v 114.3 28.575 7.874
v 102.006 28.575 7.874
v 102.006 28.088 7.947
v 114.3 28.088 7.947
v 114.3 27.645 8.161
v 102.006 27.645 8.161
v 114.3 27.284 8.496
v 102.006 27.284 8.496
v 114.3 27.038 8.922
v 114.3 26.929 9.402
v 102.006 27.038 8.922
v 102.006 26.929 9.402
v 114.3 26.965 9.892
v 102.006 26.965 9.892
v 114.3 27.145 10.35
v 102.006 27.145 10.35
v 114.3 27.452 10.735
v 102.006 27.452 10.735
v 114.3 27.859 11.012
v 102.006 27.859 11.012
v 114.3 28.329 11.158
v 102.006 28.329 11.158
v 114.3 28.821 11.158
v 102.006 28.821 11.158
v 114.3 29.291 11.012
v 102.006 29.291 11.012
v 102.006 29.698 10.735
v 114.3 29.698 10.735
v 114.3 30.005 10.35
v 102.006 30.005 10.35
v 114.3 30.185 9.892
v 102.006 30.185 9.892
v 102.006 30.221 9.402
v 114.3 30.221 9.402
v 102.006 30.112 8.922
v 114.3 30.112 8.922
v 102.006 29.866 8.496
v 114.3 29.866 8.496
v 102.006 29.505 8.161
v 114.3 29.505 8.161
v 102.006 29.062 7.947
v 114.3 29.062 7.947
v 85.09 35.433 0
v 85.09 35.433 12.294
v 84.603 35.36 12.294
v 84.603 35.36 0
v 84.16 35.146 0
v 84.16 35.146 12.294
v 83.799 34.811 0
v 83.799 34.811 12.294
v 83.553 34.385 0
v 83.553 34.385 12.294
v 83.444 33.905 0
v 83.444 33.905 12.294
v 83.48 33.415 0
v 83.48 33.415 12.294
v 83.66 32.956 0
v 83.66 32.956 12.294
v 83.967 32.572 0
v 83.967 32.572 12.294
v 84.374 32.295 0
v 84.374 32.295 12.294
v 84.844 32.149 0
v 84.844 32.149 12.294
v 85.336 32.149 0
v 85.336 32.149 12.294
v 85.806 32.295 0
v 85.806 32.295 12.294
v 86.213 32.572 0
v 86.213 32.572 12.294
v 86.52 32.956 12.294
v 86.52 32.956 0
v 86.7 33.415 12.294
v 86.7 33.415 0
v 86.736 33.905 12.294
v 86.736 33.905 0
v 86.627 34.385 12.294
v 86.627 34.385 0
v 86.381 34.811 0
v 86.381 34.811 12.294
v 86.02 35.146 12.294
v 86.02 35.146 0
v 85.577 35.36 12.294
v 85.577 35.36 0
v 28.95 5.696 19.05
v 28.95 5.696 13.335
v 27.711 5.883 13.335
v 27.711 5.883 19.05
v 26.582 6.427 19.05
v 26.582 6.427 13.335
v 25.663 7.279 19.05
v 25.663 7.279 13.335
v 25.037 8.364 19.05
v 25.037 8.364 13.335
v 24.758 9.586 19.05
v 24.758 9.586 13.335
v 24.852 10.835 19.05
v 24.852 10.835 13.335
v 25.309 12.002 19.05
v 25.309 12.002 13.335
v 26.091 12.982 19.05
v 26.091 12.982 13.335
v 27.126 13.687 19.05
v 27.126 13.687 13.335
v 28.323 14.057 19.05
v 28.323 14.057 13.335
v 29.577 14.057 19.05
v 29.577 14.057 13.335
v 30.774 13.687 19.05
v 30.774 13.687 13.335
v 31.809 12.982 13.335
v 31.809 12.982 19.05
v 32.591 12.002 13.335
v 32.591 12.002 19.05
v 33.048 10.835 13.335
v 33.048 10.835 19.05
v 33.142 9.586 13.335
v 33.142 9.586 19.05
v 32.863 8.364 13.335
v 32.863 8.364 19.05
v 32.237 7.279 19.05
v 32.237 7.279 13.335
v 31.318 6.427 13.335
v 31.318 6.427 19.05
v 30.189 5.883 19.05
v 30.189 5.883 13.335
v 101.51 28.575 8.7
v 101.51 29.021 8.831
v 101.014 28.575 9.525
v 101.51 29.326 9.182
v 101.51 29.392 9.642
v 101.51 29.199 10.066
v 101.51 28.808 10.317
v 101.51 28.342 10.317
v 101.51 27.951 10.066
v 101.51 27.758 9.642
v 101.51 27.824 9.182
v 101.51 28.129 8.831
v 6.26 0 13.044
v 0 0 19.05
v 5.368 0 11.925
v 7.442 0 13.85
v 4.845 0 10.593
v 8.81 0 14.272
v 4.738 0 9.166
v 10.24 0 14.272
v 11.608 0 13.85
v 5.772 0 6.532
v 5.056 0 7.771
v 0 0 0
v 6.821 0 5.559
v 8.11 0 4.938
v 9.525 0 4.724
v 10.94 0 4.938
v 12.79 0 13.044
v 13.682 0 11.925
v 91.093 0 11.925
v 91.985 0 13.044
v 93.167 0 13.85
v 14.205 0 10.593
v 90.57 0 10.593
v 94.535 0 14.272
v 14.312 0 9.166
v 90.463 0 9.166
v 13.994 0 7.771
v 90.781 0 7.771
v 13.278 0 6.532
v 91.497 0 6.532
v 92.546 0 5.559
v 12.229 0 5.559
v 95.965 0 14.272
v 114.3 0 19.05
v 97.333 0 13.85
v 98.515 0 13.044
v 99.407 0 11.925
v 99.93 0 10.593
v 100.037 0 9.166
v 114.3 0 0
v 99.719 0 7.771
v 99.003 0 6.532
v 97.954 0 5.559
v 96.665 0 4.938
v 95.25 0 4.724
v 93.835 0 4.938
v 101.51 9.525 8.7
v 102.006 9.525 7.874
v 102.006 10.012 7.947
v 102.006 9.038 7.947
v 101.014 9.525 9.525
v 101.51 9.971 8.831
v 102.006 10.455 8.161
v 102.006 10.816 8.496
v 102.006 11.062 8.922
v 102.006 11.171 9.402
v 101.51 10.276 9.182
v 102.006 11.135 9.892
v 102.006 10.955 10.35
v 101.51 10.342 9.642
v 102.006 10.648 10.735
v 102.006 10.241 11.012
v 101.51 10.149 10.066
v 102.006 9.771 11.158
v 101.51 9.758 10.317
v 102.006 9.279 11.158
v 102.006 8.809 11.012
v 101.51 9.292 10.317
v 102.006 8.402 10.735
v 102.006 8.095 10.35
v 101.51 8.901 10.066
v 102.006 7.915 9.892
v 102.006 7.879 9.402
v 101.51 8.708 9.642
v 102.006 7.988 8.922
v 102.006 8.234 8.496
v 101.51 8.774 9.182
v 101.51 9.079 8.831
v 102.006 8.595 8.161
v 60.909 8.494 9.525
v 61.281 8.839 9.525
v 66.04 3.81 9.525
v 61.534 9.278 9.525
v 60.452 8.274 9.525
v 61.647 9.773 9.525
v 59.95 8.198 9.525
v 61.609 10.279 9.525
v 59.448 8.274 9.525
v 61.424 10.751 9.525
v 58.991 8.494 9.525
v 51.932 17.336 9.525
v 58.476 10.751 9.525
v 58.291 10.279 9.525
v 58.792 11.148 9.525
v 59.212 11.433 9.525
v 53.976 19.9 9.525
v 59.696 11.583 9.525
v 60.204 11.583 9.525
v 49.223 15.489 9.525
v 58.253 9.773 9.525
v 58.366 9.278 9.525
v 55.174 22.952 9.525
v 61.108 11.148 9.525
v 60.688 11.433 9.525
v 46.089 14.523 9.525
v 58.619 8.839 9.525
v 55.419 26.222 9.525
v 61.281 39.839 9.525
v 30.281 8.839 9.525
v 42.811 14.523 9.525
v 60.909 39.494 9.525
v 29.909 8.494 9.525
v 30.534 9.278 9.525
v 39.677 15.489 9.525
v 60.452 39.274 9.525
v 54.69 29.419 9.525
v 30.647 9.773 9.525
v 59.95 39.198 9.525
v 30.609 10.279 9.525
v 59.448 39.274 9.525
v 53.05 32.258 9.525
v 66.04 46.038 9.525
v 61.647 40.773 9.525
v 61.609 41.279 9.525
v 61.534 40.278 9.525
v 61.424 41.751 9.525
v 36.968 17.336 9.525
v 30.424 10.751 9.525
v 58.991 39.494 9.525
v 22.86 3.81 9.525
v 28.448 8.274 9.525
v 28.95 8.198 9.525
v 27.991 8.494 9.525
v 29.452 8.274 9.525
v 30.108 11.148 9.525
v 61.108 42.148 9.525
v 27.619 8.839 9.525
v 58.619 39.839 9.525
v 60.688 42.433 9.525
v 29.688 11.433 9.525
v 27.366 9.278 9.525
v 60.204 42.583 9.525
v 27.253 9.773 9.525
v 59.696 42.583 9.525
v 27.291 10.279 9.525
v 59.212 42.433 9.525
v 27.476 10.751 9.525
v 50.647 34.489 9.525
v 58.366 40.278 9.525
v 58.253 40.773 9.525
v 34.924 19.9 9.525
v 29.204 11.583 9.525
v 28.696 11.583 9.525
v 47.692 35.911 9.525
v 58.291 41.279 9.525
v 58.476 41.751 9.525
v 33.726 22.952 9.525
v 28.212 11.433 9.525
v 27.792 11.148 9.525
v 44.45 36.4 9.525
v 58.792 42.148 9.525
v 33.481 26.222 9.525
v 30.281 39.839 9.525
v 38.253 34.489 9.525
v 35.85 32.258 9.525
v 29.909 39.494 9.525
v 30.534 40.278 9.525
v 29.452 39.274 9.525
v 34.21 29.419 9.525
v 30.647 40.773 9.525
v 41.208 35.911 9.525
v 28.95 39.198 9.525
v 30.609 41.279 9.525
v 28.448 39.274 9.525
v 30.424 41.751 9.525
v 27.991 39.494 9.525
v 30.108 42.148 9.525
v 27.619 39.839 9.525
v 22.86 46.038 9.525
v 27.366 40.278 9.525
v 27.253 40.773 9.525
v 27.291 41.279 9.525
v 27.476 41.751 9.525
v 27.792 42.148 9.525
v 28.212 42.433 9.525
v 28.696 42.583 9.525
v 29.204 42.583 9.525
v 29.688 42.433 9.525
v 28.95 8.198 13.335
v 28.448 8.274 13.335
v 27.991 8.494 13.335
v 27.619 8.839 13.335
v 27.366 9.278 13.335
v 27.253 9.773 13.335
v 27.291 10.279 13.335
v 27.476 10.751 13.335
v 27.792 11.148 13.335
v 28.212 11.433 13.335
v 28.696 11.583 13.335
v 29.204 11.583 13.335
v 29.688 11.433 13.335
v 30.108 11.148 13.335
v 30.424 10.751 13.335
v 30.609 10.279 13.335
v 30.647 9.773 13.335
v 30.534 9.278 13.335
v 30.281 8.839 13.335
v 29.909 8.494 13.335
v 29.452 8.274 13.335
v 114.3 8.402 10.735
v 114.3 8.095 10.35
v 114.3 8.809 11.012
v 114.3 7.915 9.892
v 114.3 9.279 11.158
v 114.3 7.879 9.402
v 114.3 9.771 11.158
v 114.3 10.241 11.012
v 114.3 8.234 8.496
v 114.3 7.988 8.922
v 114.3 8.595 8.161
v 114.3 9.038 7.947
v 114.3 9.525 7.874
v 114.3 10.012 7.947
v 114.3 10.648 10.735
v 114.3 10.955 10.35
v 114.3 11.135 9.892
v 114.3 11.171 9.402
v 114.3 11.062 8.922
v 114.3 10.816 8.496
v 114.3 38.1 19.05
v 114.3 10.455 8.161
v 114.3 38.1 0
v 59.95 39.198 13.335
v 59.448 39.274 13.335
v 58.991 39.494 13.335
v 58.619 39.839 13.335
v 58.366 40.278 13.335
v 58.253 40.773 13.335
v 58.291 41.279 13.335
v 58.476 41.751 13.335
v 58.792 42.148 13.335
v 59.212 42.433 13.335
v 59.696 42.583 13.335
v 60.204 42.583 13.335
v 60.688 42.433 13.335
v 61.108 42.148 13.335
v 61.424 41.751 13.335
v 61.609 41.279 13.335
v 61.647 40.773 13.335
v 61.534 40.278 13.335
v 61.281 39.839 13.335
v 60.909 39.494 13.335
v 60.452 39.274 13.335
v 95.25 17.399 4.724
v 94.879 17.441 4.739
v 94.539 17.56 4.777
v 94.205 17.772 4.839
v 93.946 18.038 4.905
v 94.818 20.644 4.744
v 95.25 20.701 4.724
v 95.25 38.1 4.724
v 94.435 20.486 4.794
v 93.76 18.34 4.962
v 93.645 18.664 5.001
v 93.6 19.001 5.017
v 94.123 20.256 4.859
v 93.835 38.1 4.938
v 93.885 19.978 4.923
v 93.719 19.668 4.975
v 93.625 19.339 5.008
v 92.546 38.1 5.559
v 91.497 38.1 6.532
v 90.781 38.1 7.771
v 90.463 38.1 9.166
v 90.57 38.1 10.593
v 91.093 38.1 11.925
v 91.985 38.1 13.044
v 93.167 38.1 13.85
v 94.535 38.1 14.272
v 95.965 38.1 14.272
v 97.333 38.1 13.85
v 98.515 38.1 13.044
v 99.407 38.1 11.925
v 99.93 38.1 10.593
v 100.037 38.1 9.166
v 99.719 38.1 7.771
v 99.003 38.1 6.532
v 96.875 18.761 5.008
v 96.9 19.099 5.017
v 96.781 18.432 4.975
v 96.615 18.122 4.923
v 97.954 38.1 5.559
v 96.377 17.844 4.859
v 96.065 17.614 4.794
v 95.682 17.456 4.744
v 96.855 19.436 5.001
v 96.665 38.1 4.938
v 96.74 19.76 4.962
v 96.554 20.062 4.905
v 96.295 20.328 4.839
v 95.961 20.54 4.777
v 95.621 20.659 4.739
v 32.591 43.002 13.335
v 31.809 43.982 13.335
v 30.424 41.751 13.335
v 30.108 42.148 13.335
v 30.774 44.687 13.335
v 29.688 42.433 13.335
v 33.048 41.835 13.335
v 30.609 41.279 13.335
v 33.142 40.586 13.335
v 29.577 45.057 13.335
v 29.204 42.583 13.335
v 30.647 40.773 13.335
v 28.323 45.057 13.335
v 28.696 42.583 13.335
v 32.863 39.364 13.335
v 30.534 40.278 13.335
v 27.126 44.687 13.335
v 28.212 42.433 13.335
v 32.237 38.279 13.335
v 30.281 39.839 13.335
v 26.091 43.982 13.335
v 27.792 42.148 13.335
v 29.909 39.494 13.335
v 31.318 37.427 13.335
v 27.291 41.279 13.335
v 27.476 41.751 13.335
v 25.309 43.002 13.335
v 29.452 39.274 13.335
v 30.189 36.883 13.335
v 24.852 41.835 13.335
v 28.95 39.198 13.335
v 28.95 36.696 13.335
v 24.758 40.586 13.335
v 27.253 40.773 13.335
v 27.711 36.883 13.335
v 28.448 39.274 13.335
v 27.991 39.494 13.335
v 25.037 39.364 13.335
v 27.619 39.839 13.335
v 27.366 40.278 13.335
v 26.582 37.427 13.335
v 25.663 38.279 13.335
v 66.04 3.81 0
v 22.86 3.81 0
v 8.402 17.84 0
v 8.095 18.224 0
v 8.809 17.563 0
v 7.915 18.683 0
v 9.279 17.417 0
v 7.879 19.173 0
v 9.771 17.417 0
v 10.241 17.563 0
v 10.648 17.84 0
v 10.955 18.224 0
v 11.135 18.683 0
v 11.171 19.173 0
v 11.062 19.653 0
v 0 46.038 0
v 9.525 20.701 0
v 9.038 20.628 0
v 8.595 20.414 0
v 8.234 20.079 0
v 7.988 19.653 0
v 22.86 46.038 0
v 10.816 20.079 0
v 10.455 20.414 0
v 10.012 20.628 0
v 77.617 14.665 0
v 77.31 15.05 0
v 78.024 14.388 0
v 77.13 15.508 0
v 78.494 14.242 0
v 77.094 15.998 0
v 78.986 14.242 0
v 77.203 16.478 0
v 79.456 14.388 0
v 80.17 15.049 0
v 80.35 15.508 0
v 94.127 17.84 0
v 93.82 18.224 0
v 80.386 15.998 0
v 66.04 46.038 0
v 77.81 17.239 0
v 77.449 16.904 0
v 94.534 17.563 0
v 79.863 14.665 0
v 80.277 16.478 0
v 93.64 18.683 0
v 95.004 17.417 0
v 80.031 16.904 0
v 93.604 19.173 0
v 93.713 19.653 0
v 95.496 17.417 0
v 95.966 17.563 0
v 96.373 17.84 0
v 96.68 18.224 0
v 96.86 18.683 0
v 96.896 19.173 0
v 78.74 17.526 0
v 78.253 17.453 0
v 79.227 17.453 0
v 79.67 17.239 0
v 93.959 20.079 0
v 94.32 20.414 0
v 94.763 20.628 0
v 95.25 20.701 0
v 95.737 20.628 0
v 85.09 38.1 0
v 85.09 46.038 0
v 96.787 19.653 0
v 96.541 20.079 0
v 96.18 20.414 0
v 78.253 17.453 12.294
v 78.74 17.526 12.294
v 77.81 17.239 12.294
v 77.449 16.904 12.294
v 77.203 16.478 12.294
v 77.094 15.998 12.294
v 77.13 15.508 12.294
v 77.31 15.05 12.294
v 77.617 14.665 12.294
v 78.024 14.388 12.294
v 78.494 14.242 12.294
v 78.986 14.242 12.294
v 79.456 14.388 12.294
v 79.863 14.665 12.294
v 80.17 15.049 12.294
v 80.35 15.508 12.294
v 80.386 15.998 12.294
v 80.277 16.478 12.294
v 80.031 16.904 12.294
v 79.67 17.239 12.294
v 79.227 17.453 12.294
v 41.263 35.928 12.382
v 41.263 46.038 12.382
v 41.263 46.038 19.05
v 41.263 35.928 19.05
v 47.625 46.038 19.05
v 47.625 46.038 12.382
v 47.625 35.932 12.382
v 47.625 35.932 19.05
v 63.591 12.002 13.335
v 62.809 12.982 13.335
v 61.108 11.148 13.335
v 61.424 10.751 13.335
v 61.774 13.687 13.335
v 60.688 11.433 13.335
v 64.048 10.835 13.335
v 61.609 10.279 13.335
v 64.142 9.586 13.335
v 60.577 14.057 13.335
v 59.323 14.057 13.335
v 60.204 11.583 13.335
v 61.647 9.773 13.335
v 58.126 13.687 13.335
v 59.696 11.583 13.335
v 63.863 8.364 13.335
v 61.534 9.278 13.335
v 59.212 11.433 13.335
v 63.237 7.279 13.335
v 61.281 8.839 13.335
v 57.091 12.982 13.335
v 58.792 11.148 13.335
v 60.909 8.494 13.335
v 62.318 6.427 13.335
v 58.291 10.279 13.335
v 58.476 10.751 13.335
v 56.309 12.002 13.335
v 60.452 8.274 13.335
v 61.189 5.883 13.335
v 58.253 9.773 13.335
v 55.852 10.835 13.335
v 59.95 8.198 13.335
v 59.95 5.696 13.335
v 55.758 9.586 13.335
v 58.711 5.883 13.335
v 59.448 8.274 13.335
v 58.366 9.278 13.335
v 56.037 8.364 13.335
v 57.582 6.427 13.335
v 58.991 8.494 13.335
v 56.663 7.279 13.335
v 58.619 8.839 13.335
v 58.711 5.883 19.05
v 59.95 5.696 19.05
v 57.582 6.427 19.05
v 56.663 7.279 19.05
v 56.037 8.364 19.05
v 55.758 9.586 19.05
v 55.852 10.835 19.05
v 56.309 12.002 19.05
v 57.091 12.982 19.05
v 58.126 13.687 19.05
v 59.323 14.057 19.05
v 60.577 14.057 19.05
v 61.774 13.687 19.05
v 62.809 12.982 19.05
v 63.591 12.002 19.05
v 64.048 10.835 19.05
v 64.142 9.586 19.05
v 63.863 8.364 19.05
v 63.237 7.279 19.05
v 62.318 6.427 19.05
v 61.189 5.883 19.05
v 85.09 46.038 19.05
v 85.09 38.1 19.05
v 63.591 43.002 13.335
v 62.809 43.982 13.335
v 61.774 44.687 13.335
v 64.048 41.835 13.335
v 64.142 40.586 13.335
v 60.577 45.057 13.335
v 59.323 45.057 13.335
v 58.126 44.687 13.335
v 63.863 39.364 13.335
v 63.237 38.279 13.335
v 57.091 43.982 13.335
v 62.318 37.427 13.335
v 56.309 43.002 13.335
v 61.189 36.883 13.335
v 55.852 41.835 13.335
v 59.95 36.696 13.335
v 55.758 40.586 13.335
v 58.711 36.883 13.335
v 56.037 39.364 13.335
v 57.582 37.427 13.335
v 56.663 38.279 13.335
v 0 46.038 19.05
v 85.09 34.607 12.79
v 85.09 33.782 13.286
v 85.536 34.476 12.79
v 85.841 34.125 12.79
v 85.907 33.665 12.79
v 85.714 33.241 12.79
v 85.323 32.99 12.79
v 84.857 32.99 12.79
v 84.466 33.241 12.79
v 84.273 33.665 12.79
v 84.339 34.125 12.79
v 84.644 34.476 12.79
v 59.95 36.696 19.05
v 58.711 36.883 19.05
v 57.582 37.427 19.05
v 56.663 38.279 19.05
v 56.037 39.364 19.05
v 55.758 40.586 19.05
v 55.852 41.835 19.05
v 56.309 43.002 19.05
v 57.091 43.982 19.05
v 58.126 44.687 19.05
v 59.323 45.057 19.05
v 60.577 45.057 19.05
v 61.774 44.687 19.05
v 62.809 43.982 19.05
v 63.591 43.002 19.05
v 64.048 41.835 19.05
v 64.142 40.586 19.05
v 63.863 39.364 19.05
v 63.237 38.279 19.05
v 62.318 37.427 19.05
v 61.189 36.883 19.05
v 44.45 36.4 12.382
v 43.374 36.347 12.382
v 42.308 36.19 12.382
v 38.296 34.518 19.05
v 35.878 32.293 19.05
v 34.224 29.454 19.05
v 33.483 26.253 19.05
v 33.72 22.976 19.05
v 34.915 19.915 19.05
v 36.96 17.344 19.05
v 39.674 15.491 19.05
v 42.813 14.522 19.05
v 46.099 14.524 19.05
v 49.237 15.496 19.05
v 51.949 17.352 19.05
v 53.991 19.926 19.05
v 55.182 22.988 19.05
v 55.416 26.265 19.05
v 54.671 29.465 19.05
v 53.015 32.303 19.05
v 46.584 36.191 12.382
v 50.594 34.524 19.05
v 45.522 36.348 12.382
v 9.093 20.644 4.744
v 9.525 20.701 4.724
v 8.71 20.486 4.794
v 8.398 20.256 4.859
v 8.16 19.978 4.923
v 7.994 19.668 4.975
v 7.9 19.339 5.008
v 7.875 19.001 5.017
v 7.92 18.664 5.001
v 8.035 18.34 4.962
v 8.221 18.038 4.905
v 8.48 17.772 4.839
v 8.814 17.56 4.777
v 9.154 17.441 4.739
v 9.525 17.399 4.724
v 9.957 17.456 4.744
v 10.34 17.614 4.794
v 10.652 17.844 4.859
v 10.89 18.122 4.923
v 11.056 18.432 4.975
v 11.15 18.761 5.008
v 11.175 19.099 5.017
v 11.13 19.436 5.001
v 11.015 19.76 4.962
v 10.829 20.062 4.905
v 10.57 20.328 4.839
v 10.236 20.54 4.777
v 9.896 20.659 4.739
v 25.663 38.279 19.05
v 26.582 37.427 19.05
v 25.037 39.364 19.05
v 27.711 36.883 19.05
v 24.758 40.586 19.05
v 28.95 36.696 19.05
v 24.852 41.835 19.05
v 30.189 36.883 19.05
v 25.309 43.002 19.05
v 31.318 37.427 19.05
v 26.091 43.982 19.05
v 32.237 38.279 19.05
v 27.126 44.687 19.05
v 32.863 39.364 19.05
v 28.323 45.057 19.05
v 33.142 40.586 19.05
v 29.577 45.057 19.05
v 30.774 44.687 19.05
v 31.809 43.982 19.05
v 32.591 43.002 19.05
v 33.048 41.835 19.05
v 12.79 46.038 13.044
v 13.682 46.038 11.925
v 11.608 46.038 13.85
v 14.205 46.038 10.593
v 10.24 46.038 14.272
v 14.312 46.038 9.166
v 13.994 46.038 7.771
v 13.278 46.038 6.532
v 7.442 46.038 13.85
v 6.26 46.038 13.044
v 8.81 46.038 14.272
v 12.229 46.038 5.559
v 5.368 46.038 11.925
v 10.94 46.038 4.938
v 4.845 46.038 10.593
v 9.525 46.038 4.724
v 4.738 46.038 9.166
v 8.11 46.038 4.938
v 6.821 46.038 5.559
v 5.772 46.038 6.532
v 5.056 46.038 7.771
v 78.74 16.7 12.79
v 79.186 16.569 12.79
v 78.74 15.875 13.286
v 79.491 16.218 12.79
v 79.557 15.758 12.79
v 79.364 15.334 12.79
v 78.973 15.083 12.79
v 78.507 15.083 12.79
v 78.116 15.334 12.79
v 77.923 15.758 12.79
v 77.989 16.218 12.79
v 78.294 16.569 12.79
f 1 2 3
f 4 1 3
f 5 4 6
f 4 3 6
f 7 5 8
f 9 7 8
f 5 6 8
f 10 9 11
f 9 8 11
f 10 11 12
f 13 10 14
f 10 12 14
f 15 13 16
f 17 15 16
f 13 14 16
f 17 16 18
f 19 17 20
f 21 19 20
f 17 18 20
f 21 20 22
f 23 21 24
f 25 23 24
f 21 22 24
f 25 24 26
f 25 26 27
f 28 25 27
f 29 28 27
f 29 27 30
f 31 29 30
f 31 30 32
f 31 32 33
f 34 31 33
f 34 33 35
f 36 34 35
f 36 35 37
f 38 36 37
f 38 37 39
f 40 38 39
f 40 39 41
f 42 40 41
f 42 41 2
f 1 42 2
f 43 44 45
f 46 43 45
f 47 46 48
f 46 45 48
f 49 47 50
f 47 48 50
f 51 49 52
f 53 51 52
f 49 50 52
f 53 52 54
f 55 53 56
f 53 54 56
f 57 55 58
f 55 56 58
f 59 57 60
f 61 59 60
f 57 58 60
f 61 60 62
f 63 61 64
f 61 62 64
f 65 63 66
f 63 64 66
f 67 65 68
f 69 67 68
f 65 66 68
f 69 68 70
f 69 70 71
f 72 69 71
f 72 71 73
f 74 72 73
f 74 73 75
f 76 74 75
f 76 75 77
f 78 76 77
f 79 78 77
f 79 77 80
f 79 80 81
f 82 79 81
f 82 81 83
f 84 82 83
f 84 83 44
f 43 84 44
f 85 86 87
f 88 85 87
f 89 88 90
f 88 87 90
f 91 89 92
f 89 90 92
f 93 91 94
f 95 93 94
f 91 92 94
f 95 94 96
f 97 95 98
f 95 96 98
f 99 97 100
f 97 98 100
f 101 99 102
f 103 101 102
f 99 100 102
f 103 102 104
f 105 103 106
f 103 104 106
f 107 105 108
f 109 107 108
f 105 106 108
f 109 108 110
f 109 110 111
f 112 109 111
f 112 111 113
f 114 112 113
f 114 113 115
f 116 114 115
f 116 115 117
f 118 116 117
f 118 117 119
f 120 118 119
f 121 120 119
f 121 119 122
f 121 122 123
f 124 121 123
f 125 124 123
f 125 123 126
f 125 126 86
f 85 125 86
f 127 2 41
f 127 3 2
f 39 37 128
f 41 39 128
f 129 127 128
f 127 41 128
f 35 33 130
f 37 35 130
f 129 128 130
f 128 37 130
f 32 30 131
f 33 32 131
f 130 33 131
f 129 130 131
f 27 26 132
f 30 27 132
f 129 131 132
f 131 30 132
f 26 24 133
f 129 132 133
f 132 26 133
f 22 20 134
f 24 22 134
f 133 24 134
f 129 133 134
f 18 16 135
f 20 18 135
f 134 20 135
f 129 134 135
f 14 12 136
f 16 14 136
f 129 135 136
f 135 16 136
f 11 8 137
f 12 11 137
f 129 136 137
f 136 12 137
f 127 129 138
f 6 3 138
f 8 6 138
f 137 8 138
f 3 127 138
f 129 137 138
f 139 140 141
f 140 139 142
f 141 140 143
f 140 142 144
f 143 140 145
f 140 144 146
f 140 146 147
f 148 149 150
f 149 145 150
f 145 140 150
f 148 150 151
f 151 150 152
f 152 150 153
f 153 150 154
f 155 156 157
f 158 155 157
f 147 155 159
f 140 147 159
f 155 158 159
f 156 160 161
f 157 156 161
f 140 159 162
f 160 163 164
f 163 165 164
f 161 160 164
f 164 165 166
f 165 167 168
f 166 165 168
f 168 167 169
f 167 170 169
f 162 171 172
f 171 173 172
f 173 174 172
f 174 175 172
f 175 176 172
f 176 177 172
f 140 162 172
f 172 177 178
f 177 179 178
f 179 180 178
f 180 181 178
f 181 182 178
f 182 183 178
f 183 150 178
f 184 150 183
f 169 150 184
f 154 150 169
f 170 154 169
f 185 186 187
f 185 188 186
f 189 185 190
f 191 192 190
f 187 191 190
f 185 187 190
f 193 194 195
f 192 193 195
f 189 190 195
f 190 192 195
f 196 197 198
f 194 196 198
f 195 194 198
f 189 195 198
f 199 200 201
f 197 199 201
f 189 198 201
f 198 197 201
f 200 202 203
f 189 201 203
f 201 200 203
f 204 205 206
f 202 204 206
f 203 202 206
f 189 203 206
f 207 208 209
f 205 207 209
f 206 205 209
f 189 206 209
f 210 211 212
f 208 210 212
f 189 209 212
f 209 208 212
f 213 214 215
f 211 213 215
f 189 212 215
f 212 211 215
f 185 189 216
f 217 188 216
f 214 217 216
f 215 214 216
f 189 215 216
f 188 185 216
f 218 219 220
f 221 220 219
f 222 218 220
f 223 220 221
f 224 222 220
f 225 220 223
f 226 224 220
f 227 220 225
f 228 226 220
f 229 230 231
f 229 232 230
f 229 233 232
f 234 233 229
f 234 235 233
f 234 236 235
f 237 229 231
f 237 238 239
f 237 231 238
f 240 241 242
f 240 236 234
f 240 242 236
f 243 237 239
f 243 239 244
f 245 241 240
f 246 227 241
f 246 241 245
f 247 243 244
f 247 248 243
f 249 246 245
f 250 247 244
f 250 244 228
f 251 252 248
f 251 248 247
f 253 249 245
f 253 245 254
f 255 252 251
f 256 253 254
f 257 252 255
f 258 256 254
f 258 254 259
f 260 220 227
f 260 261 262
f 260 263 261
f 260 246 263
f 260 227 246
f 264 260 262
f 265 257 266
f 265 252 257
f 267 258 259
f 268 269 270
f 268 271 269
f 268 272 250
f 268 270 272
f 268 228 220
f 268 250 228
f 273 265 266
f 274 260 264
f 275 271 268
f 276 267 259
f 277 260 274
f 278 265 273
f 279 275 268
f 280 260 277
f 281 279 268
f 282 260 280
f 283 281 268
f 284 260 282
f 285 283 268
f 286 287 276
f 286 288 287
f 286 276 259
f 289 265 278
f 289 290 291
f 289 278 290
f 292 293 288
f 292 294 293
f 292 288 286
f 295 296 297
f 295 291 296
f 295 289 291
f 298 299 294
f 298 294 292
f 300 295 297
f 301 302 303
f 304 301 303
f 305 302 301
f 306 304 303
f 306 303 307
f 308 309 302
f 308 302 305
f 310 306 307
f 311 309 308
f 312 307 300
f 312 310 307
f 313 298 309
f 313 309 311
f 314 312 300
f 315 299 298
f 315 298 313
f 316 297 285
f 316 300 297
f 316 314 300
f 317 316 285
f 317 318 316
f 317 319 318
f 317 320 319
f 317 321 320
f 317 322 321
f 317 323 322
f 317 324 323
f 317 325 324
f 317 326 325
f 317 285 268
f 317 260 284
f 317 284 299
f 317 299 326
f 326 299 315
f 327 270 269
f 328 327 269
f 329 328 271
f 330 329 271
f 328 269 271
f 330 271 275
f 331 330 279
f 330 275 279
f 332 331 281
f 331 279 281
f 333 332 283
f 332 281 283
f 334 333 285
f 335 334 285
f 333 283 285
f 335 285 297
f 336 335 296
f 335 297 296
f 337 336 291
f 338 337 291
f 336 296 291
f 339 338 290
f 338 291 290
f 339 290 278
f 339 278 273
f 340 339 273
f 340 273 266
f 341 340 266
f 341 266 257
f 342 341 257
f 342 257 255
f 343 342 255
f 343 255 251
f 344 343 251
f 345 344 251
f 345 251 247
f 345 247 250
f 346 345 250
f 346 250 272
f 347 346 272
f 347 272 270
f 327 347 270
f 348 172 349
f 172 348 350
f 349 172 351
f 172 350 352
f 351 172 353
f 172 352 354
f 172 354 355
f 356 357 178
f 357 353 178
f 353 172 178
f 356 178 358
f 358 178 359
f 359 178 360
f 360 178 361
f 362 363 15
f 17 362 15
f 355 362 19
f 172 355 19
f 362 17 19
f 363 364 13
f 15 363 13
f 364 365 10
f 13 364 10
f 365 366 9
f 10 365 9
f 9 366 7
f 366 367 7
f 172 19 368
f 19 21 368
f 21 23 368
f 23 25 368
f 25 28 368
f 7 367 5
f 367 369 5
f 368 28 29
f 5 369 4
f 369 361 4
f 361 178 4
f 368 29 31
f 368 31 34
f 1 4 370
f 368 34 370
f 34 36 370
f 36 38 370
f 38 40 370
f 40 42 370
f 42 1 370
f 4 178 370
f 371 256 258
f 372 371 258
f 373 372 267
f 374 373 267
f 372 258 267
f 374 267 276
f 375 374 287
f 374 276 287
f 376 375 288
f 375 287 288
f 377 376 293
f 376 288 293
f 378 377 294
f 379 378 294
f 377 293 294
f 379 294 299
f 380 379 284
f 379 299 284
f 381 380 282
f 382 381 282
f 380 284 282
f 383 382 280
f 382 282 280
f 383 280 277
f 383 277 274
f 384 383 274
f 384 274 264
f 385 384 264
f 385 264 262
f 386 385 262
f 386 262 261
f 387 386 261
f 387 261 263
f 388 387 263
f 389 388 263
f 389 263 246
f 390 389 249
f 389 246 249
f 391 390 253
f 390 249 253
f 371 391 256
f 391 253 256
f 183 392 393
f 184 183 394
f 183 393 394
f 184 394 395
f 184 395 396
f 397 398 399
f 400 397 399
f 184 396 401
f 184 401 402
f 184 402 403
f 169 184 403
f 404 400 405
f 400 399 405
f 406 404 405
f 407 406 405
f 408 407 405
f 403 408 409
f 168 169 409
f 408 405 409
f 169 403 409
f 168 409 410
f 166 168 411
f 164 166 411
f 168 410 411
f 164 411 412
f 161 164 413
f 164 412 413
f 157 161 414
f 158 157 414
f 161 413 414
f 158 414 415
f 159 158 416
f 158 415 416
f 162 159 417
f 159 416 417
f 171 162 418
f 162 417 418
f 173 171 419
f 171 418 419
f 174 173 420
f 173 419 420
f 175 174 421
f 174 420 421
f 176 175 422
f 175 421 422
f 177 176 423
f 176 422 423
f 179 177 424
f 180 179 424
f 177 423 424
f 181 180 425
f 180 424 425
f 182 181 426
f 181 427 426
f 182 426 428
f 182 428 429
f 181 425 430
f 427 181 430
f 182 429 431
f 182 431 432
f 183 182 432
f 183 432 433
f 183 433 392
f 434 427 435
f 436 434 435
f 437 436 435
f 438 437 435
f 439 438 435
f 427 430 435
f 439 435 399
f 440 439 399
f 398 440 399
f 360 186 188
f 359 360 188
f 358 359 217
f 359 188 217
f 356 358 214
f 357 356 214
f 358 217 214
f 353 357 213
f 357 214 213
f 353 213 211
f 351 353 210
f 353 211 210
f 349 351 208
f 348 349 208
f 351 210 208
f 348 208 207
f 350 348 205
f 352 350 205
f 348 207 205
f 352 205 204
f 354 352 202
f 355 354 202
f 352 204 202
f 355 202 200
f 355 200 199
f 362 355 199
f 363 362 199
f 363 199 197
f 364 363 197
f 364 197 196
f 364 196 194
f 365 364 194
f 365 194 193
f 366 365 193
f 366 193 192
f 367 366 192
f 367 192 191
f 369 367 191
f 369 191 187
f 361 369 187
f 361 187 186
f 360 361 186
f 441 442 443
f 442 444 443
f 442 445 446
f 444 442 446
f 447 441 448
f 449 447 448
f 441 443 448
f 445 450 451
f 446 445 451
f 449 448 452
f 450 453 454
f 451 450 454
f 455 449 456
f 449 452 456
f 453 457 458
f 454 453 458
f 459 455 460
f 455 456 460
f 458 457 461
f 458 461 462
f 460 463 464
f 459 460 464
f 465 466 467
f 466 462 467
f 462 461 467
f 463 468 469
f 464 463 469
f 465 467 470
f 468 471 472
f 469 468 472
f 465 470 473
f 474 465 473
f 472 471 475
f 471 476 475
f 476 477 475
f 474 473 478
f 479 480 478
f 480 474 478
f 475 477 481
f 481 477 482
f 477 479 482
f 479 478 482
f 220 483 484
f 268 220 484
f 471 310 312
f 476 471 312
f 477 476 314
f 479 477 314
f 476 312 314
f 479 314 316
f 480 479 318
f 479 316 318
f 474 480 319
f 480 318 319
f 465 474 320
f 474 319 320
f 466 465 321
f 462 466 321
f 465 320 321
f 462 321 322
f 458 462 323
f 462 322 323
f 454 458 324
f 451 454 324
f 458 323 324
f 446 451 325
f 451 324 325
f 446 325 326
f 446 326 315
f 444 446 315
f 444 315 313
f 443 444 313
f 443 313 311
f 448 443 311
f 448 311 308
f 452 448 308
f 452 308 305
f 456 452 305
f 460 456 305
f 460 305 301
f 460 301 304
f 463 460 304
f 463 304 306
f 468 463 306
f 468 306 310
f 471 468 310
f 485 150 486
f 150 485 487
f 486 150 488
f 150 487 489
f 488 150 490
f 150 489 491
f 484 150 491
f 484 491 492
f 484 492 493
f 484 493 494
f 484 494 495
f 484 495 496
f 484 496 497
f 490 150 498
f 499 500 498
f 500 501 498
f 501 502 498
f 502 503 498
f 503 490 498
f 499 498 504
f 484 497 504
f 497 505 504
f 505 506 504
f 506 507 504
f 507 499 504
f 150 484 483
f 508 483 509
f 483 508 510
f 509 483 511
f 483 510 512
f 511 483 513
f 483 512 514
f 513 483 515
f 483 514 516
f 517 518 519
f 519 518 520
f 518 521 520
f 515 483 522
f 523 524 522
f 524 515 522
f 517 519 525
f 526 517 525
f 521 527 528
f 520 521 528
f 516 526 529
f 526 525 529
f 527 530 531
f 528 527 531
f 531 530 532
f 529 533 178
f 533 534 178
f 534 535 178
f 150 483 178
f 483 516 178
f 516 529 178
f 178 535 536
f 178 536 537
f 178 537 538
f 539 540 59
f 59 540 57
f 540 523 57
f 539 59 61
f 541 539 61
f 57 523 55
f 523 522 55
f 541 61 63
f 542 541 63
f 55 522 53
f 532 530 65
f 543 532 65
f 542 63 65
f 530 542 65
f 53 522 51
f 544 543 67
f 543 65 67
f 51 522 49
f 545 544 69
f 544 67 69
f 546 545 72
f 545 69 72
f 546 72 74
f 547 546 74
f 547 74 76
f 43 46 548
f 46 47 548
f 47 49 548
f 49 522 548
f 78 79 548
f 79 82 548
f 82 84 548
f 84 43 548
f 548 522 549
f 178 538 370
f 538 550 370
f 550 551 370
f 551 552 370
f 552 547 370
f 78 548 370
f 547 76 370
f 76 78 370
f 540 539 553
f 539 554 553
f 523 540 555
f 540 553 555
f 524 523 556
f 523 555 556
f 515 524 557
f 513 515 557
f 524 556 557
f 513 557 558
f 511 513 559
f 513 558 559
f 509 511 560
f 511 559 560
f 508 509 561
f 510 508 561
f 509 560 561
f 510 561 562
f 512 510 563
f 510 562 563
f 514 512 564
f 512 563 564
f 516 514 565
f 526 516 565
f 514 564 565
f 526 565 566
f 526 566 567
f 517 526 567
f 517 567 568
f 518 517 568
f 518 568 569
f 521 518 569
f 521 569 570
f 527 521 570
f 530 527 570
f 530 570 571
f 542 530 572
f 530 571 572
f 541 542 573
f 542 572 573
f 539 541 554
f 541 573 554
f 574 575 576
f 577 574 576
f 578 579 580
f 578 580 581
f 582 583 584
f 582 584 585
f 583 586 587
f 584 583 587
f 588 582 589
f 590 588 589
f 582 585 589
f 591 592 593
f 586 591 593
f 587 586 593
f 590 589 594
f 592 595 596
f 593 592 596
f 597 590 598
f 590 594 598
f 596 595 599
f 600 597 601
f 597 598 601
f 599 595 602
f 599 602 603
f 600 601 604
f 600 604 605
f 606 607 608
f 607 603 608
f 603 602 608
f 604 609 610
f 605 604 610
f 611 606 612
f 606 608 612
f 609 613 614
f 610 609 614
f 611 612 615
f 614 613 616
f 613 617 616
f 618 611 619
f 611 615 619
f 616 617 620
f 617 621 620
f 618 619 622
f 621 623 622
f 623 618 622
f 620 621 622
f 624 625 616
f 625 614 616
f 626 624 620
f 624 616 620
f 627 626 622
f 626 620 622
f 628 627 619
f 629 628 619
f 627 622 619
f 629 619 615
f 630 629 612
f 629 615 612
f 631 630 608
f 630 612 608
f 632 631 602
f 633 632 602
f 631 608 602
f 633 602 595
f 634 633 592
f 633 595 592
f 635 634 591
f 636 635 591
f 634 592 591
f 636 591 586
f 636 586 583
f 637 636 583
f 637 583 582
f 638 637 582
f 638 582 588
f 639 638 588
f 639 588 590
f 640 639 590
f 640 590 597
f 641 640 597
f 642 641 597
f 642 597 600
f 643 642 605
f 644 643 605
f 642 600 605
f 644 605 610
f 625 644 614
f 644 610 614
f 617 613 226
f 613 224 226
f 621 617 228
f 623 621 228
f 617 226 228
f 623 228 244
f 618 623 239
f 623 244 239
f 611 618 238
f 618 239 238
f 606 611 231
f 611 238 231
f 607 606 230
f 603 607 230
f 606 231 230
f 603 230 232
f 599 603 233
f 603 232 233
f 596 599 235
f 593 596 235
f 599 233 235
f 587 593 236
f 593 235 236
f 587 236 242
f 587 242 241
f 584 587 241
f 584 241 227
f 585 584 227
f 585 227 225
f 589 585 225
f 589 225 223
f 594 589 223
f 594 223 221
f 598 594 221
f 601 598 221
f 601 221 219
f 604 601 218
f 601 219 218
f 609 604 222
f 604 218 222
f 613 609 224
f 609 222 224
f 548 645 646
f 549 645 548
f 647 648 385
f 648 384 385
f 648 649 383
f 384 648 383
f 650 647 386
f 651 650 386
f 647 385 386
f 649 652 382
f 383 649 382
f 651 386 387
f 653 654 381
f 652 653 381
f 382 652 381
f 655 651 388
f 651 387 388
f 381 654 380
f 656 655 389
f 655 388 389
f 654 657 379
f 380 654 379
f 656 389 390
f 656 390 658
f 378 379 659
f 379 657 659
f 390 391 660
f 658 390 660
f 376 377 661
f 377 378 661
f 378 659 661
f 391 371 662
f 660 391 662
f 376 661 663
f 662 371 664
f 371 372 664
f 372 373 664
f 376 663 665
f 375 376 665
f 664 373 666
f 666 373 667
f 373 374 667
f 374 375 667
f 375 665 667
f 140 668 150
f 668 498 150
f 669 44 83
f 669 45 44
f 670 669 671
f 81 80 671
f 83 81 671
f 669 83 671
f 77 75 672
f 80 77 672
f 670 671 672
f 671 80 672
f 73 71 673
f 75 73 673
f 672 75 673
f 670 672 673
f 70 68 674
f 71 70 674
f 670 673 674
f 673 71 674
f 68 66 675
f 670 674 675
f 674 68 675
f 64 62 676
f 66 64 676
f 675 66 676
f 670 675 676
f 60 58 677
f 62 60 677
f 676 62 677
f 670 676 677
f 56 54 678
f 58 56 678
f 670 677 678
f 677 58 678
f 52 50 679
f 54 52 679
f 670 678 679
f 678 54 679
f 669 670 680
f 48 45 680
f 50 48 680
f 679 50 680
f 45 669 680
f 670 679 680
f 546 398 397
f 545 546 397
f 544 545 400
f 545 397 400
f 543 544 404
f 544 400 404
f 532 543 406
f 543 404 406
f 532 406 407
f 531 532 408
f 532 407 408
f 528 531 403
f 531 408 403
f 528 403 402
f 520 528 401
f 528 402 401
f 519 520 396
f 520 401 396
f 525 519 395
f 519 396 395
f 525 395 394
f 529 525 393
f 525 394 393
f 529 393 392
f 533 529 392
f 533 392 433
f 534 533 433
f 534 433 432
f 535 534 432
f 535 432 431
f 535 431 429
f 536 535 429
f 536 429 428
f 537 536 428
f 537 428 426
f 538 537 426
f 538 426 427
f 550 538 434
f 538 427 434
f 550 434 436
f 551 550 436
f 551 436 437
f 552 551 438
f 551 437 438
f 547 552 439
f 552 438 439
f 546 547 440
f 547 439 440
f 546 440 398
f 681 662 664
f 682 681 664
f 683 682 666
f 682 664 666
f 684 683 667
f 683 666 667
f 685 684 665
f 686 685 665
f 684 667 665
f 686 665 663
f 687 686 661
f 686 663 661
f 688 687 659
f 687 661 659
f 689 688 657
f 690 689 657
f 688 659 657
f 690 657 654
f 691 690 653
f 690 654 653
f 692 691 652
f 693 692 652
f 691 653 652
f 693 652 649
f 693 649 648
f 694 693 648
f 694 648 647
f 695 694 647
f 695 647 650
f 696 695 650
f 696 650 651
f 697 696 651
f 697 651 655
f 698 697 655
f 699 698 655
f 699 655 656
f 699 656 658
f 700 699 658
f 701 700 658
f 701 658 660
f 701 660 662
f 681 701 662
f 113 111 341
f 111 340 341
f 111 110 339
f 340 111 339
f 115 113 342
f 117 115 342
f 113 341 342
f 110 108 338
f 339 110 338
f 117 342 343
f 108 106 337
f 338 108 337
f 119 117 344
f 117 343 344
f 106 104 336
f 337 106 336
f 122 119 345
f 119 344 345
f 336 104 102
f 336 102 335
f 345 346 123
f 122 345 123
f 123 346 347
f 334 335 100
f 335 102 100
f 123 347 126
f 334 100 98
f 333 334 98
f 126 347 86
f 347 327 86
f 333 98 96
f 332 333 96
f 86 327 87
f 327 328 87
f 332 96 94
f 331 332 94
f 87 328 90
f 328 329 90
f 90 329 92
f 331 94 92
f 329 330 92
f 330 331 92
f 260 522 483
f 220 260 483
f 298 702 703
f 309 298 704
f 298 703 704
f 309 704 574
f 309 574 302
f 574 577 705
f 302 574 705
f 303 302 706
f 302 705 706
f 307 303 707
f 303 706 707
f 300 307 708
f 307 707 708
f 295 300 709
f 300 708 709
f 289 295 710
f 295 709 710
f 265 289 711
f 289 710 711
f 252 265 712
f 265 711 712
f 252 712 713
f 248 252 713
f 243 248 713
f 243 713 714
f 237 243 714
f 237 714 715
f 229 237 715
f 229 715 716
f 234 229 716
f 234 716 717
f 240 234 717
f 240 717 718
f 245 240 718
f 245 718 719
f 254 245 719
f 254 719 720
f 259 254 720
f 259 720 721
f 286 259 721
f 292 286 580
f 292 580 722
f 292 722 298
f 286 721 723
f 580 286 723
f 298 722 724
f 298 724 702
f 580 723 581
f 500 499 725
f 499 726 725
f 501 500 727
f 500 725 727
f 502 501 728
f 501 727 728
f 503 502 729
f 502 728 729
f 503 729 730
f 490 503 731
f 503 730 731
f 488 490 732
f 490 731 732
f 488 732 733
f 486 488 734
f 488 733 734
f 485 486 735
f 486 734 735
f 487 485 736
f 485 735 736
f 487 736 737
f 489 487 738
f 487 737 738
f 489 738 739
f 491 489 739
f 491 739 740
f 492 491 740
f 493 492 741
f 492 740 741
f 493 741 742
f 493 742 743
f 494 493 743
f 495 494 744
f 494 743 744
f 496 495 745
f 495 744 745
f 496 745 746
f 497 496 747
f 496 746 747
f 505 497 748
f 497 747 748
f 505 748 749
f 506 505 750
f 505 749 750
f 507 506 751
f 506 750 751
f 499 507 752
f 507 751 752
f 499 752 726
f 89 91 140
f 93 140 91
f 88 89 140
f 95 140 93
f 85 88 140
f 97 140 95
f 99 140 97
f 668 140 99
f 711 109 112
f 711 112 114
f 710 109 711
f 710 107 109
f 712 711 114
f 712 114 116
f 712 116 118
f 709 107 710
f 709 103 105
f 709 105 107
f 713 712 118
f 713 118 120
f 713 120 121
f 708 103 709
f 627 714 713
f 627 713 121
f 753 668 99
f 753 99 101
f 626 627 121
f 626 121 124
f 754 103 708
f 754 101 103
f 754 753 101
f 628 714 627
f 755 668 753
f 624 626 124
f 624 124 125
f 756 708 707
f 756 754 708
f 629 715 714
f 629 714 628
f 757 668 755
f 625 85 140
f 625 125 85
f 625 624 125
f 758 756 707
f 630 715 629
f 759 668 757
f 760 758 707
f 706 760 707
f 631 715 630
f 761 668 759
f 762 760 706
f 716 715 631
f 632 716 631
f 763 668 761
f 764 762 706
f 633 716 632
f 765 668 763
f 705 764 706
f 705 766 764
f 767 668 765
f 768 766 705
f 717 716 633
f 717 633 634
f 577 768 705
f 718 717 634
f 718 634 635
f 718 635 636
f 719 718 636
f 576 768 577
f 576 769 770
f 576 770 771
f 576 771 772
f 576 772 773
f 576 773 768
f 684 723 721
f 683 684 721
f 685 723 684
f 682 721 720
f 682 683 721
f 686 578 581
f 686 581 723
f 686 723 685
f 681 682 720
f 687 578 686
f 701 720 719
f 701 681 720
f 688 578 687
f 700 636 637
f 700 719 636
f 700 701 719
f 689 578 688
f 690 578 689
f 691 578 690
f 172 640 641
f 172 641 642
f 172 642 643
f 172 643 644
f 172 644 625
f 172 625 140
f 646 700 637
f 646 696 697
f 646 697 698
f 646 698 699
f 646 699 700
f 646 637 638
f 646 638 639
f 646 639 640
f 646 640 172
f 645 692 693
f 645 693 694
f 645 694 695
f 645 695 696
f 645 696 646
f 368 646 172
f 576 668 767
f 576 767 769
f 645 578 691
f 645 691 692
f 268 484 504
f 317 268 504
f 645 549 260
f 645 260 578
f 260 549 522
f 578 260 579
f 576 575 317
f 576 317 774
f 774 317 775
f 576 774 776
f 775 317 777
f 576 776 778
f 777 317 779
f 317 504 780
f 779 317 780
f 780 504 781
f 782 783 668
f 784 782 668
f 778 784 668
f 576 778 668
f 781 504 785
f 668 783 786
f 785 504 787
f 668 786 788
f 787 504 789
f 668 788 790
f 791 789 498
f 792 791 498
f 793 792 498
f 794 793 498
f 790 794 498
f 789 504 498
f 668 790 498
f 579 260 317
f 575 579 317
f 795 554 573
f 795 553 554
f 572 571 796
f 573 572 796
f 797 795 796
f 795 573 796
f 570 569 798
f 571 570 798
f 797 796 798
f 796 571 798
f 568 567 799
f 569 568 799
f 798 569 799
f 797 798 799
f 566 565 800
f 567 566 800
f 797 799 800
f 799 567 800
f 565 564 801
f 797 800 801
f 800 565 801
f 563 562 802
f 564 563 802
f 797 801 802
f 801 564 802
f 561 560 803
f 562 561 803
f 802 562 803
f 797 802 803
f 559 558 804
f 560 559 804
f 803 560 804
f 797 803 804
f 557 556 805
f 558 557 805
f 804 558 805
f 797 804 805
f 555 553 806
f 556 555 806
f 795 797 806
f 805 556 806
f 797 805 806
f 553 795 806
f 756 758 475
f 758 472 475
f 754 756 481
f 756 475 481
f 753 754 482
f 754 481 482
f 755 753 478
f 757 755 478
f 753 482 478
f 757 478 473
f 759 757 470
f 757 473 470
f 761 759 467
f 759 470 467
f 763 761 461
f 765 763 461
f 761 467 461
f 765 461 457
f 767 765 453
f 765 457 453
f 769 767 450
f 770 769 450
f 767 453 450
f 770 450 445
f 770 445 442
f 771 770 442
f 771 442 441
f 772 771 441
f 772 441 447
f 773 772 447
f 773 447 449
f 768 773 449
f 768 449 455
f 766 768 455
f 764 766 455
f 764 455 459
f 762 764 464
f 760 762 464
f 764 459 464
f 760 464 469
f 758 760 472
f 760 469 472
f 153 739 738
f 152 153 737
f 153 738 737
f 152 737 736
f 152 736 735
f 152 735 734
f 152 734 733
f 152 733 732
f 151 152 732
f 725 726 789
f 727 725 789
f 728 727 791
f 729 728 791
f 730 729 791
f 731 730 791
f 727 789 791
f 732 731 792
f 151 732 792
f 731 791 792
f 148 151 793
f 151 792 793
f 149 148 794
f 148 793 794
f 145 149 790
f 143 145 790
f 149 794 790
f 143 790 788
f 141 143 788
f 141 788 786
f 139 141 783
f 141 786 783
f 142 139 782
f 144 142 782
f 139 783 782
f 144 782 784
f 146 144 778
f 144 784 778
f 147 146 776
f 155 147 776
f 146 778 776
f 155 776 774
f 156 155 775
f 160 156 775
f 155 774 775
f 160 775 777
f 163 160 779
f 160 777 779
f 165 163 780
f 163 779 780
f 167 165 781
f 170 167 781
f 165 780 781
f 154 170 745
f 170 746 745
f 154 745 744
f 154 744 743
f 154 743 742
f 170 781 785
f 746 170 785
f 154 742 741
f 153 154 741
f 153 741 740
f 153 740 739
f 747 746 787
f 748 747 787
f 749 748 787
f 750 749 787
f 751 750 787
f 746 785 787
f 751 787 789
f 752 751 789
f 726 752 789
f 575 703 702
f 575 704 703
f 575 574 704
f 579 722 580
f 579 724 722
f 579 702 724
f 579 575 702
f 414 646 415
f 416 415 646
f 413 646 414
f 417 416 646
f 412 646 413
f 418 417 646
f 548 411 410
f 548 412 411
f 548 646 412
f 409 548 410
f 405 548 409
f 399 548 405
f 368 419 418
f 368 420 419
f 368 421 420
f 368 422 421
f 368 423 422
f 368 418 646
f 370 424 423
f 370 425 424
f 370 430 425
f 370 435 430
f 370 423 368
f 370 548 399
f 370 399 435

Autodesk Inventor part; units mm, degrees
ref_plane "YZ Plane" through (0, 0, 0) normal (1, 0, 0) x (0, 1, 0)
ref_plane "XZ Plane" through (0, 0, 0) normal (0, 1, 0) x (-1, 0, 0)
ref_plane "XY Plane" through (0, 0, 0) normal (0, 0, 1) x (1, 0, 0)
sketch "Sketch1" plane through (0, 0, 0) normal (0, 0, 1) x (1, 0, 0)
  line L0 (0, 0) -> (114.3, 0)
  line L1 (114.3, 0) -> (114.3, 46.0375)
  line L2 (114.3, 46.0375) -> (0, 46.0375)
  line L3 (0, 46.0375) -> (0, 0)
  line L4 (69.85, 46.0375) -> (19.05, 46.0375)
  point P0 (44.45, 46.0375)
  dimension "d0" = 114.3
  dimension "d1" = 46.0375
  dimension "d62" = 69.85
extrude "Extrusion1" add sketch "Sketch1" along normal blind 19.05
sketch "Sketch2" plane through (0, 0, 0) normal (0, 0, -1) x (-1, 0, 0)
  line L0 (-114.3, 46.0375) -> (0, 46.0375) projected
  line L1 (-114.3, 0) -> (-114.3, 46.0375) projected
  point P0 (0, 0)
  point P1 (-44.45, 25.4)
  point P2 (-19.05, 38.1)
  point P3 (0, 46.0375)
  dimension "d7" = 20.6375
  dimension "d8" = 69.85
hole "Hole1" at (44.45, 25.4, 0) direction (0, 0, 1) diameter 22 depth 25.4 tip angle 118
sketch "Sketch3" plane through (0, 0, 0) normal (0, 0, -1) x (-1, 0, 0)
  line L0 (-66.04, 3.81) -> (-22.86, 3.81)
  line L1 (-22.86, 3.81) -> (-22.86, 46.99)
  line L2 (-22.86, 46.99) -> (-66.04, 46.99)
  line L3 (-66.04, 46.99) -> (-66.04, 3.81)
  line L4 (-66.04, 3.81) -> (-22.86, 46.99) construction
  line L5 (-22.86, 3.81) -> (-66.04, 46.99) construction
  line L6 (-114.3, 46.0375) -> (0, 46.0375) projected
  line L7 (-69.85, 46.0375) -> (-19.05, 46.0375) projected
  line L8 (-66.04, 46.99) -> (-22.86, 46.99)
  line L9 (-22.86, 46.99) -> (-22.86, 46.0375)
  line L10 (-22.86, 46.0375) -> (-66.04, 46.0375)
  line L11 (-66.04, 46.0375) -> (-66.04, 46.99)
  line L12 (-114.3, 0) -> (-114.3, 46.0375) projected
  point P0 (0, 0)
  point P1 (-44.45, 25.4)
  point P2 (-19.05, 38.1)
  point P3 (0, 46.0375)
  dimension "d16" = 20.6375
  dimension "d17" = 43.18
  dimension "d18" = 43.18
  dimension "d21" = 69.85
  dimension "d22" = 43.18
extrude "Extrusion2" cut sketch "Sketch3" against normal blind 9.525
sketch "Sketch4" plane through (0, 0, 19.05) normal (0, 0, 1) x (1, 0, 0)
  line L0 (28.95, 9.9) -> (59.95, 9.9)
  line L1 (59.95, 9.9) -> (59.95, 40.9)
  line L2 (59.95, 40.9) -> (28.95, 40.9)
  line L3 (28.95, 40.9) -> (28.95, 9.9)
  line L4 (28.95, 9.9) -> (59.95, 40.9) construction
  line L5 (59.95, 9.9) -> (28.95, 40.9) construction
  line L6 (114.3, 46.0375) -> (0, 46.0375) projected
  line L7 (114.3, 0) -> (114.3, 46.0375) projected
  point P0 (0, 0)
  point P1 (44.45, 25.4)
  point P2 (69.85, 38.1)
  point P3 (0, 46.0375)
  dimension "d23" = 20.6375
  dimension "d24" = 69.85
  dimension "d25" = 31
  dimension "d26" = 31
hole "Hole2" at (28.95, 40.9, 19.05) at (28.95, 9.9, 19.05) at (59.95, 40.9, 19.05) at (59.95, 9.9, 19.05) direction (0, 0, -1) diameter 3.4036 end through all counterbore diameter 8.4074 counterbore depth 5.715 clearance for "Hex Head Machine Screw" size "M3" standard "Ansi Metric M Profile"
sketch "Sketch5" plane through (0, 0, 0) normal (0, -1, 0) x (1, 0, 0)
  line L0 (95.25, 9.525) -> (9.525, 9.525)
  line L1 (0, 0) -> (114.3, 0) projected
  line L2 (114.3, 0) -> (114.3, 19.05) projected
  dimension "d34" = 85.725
  dimension "d35" = 9.525
  dimension "d36" = 19.05
hole "Hole3" at (95.25, 0, 9.525) at (9.525, 0, 9.525) direction (0, 1, 0) diameter 9.6012 end through all
sketch "Sketch6" plane through (0, 0, 0) normal (0, 0, -1) x (-1, 0, 0)
  line L0 (-114.3, 46.0375) -> (0, 46.0375) projected
  line L1 (0, 46.0375) -> (0, 0) projected
  line L2 (0, 0) -> (-114.3, 0) projected
  line L3 (-100.0506, 46.0375) -> (-90.4494, 46.0375) projected
  line L4 (-114.3, 0) -> (-114.3, 46.0375) projected
  line L5 (-14.3256, 46.0375) -> (-4.7244, 46.0375) projected
  point P0 (-19.05, 38.1)
  point P1 (-95.25, 19.05)
  point P2 (-9.525, 19.05)
  point P3 (-19.05, 46.0375)
  point P4 (-22.86, 0)
  dimension "d105" = 19.05
  dimension "d108" = 19.05
  dimension "d110" = 9.6012
  dimension "d111" = 4.8006
  dimension "d112" = 9.525
hole "Hole4" at (95.25, 19.05, 0) at (9.525, 19.05, 0) direction (0, 0, 1) diameter 3.302 depth 12.2936 tip angle 118 thread size "8-32 UNC" class "2B" standard "ANSI Unified Screw Threads"
sketch "Sketch8" plane through (114.3, 0, 0) normal (1, 0, 0) x (0, 0, -1)
  line L0 (-19.05, 46.0375) -> (-19.05, 0) projected
  line L1 (0, 0) -> (-19.05, 0) projected
  line L2 (0, 46.0375) -> (-19.05, 46.0375) projected
  point P0 (-9.525, 9.525)
  point P1 (-9.525, 28.575)
  dimension "d87" = 19.05
  dimension "d88" = 9.525
  dimension "d90" = 9.525
  dimension "d99" = 9.525
hole "Hole8" at (114.3, 9.525, 9.525) at (114.3, 28.575, 9.525) direction (-1, 0, 0) diameter 3.302 depth 12.2936 tip angle 118 thread size "8-32 UNC" class "2B" standard "ANSI Unified Screw Threads"
sketch "Sketch11" plane through (0, 46.0375, 19.05) normal (0, 1, 0) x (1, 0, 0)
  line L0 (66.04, 9.525) -> (22.86, 9.525) projected
  line L1 (114.3, 0) -> (0, 0) projected
  line L2 (22.86, 9.525) -> (22.86, 19.05) projected
  line L3 (66.04, 19.05) -> (66.04, 9.525) projected
  point P0 (0, 19.05)
  point P1 (44.45, 4.7625)
  dimension "d114" = 9.525
  dimension "d115" = 43.18
  dimension "d116" = 4.7625
  dimension "d117" = 21.59
hole "Hole9" at (44.45, 46.0375, 14.2875) direction (0, -1, 0) diameter 3.81 depth 19.05 tip angle 118 clearance for "Hex Machine Screw" size "#6" standard "Ansi Unified Screw Threads"
sketch "Sketch14" plane through (0, 46.0375, 19.05) normal (0, 1, 0) x (1, 0, 0)
  line L0 (0, 0) -> (114.3, 0) projected
  line L1 (0, 19.05) -> (114.3, 19.05) projected
  line L2 (114.3, 0) -> (85.09, 0)
  line L3 (85.09, 0) -> (85.09, 19.05)
  line L4 (85.09, 19.05) -> (114.3, 19.05)
  line L5 (114.3, 19.05) -> (114.3, 0)
  dimension "d130" = 29.21
extrude "Extrusion5" cut sketch "Sketch14" against normal blind 7.9375
sketch "Sketch15" plane through (0, 0, 0) normal (0, 0, -1) x (-1, 0, 0)
  line L0 (-22.86, 3.81) -> (-66.04, 3.81) projected
  line L1 (-66.04, 3.81) -> (-66.04, 46.0375) projected
  line L2 (-85.09, 38.1) -> (-114.3, 38.1) projected
  line L3 (-85.09, 46.0375) -> (-85.09, 38.1) projected
  point P0 (0, 0)
  point P1 (-78.74, 15.875)
  point P2 (-85.09, 33.782)
  dimension "d133" = 12.065
  dimension "d134" = 12.7
  dimension "d135" = 4.318
  dimension "d136" = 0
hole "Hole10" at (78.74, 15.875, 0) at (85.09, 33.782, 0) direction (0, 0, 1) diameter 3.302 depth 12.2936 tip angle 118 thread size "8-32 UNC" class "2B" standard "ANSI Unified Screw Threads"
sketch "Sketch16" plane through (0, 46.0375, 19.05) normal (0, 1, 0) x (1, 0, 0)
  point P0 (0, 19.05)
sketch "Sketch17" plane through (0, 46.0375, 19.05) normal (0, 1, 0) x (1, 0, 0)
  circle A0 centre (44.45, 4.7625) radius 1.905 projected
  line L0 (0, 0) -> (114.3, 0) projected
  line L1 (44.45, 6.6675) -> (41.2634, 6.6675)
  line L2 (41.2634, 6.6675) -> (41.2634, 0)
  line L3 (41.2634, 0) -> (44.45, 0)
  line L4 (44.45, 0) -> (44.45, 6.6675)
  line L5 (44.45, 6.6675) -> (47.625, 6.6675)
  line L6 (47.625, 6.6675) -> (47.625, 0)
  line L7 (47.625, 0) -> (44.45, 0)
  line L8 (44.45, 0) -> (44.45, 6.6675)
  point P0 (0, 19.05)
  dimension "d144" = 3.175
extrude "Extrusion6" cut sketch "Sketch17" against normal blind 25.4
sketch "Sketch9" plane through (0, 0, 0) normal (0, 0, -1) x (-1, 0, 0)
  line L0 (-139.7, 41.275) -> (0, 41.275)
  line L1 (0, 0) -> (-114.3, 0) projected
  line L2 (-101.6, 31.369) -> (-38.1, 31.369)
  line L3 (0, 46.0375) -> (0, 0) projected
  line L4 (-19.05, 46.0375) -> (0, 46.0375) projected
  line L5 (0, 46.0375) -> (-31.75, 41.275)
  line L6 (-4.5219, 55.376) -> (-36.0166, 50.6518)
  point P0 (-19.05, 38.1)
  point P1 (-23.7267, 67.9523)
  dimension "d63" = 41.275
  dimension "d64" = 9.906
  dimension "d65" = 139.7
  dimension "d66" = 0
  dimension "d67" = 31.75
  dimension "d68" = 9.906
  dimension "d69" = 9.906
  dimension "d71" = 63.5
  dimension "d72" = 38.1
sketch "Sketch7" plane through (0, 0, 0) normal (-1, 0, 0) x (0, 0, 1)
  line L0 (9.525, 46.0375) -> (9.525, 3.81) projected
  line L1 (9.525, 24.9237) -> (9.525, -32.2263)
  point P0 (0, 0)
  point P1 (9.525, 89.85)
  dimension "d54" = 57.15
equation "\"d108\" = d105"
properties part number "ps system back mount"
